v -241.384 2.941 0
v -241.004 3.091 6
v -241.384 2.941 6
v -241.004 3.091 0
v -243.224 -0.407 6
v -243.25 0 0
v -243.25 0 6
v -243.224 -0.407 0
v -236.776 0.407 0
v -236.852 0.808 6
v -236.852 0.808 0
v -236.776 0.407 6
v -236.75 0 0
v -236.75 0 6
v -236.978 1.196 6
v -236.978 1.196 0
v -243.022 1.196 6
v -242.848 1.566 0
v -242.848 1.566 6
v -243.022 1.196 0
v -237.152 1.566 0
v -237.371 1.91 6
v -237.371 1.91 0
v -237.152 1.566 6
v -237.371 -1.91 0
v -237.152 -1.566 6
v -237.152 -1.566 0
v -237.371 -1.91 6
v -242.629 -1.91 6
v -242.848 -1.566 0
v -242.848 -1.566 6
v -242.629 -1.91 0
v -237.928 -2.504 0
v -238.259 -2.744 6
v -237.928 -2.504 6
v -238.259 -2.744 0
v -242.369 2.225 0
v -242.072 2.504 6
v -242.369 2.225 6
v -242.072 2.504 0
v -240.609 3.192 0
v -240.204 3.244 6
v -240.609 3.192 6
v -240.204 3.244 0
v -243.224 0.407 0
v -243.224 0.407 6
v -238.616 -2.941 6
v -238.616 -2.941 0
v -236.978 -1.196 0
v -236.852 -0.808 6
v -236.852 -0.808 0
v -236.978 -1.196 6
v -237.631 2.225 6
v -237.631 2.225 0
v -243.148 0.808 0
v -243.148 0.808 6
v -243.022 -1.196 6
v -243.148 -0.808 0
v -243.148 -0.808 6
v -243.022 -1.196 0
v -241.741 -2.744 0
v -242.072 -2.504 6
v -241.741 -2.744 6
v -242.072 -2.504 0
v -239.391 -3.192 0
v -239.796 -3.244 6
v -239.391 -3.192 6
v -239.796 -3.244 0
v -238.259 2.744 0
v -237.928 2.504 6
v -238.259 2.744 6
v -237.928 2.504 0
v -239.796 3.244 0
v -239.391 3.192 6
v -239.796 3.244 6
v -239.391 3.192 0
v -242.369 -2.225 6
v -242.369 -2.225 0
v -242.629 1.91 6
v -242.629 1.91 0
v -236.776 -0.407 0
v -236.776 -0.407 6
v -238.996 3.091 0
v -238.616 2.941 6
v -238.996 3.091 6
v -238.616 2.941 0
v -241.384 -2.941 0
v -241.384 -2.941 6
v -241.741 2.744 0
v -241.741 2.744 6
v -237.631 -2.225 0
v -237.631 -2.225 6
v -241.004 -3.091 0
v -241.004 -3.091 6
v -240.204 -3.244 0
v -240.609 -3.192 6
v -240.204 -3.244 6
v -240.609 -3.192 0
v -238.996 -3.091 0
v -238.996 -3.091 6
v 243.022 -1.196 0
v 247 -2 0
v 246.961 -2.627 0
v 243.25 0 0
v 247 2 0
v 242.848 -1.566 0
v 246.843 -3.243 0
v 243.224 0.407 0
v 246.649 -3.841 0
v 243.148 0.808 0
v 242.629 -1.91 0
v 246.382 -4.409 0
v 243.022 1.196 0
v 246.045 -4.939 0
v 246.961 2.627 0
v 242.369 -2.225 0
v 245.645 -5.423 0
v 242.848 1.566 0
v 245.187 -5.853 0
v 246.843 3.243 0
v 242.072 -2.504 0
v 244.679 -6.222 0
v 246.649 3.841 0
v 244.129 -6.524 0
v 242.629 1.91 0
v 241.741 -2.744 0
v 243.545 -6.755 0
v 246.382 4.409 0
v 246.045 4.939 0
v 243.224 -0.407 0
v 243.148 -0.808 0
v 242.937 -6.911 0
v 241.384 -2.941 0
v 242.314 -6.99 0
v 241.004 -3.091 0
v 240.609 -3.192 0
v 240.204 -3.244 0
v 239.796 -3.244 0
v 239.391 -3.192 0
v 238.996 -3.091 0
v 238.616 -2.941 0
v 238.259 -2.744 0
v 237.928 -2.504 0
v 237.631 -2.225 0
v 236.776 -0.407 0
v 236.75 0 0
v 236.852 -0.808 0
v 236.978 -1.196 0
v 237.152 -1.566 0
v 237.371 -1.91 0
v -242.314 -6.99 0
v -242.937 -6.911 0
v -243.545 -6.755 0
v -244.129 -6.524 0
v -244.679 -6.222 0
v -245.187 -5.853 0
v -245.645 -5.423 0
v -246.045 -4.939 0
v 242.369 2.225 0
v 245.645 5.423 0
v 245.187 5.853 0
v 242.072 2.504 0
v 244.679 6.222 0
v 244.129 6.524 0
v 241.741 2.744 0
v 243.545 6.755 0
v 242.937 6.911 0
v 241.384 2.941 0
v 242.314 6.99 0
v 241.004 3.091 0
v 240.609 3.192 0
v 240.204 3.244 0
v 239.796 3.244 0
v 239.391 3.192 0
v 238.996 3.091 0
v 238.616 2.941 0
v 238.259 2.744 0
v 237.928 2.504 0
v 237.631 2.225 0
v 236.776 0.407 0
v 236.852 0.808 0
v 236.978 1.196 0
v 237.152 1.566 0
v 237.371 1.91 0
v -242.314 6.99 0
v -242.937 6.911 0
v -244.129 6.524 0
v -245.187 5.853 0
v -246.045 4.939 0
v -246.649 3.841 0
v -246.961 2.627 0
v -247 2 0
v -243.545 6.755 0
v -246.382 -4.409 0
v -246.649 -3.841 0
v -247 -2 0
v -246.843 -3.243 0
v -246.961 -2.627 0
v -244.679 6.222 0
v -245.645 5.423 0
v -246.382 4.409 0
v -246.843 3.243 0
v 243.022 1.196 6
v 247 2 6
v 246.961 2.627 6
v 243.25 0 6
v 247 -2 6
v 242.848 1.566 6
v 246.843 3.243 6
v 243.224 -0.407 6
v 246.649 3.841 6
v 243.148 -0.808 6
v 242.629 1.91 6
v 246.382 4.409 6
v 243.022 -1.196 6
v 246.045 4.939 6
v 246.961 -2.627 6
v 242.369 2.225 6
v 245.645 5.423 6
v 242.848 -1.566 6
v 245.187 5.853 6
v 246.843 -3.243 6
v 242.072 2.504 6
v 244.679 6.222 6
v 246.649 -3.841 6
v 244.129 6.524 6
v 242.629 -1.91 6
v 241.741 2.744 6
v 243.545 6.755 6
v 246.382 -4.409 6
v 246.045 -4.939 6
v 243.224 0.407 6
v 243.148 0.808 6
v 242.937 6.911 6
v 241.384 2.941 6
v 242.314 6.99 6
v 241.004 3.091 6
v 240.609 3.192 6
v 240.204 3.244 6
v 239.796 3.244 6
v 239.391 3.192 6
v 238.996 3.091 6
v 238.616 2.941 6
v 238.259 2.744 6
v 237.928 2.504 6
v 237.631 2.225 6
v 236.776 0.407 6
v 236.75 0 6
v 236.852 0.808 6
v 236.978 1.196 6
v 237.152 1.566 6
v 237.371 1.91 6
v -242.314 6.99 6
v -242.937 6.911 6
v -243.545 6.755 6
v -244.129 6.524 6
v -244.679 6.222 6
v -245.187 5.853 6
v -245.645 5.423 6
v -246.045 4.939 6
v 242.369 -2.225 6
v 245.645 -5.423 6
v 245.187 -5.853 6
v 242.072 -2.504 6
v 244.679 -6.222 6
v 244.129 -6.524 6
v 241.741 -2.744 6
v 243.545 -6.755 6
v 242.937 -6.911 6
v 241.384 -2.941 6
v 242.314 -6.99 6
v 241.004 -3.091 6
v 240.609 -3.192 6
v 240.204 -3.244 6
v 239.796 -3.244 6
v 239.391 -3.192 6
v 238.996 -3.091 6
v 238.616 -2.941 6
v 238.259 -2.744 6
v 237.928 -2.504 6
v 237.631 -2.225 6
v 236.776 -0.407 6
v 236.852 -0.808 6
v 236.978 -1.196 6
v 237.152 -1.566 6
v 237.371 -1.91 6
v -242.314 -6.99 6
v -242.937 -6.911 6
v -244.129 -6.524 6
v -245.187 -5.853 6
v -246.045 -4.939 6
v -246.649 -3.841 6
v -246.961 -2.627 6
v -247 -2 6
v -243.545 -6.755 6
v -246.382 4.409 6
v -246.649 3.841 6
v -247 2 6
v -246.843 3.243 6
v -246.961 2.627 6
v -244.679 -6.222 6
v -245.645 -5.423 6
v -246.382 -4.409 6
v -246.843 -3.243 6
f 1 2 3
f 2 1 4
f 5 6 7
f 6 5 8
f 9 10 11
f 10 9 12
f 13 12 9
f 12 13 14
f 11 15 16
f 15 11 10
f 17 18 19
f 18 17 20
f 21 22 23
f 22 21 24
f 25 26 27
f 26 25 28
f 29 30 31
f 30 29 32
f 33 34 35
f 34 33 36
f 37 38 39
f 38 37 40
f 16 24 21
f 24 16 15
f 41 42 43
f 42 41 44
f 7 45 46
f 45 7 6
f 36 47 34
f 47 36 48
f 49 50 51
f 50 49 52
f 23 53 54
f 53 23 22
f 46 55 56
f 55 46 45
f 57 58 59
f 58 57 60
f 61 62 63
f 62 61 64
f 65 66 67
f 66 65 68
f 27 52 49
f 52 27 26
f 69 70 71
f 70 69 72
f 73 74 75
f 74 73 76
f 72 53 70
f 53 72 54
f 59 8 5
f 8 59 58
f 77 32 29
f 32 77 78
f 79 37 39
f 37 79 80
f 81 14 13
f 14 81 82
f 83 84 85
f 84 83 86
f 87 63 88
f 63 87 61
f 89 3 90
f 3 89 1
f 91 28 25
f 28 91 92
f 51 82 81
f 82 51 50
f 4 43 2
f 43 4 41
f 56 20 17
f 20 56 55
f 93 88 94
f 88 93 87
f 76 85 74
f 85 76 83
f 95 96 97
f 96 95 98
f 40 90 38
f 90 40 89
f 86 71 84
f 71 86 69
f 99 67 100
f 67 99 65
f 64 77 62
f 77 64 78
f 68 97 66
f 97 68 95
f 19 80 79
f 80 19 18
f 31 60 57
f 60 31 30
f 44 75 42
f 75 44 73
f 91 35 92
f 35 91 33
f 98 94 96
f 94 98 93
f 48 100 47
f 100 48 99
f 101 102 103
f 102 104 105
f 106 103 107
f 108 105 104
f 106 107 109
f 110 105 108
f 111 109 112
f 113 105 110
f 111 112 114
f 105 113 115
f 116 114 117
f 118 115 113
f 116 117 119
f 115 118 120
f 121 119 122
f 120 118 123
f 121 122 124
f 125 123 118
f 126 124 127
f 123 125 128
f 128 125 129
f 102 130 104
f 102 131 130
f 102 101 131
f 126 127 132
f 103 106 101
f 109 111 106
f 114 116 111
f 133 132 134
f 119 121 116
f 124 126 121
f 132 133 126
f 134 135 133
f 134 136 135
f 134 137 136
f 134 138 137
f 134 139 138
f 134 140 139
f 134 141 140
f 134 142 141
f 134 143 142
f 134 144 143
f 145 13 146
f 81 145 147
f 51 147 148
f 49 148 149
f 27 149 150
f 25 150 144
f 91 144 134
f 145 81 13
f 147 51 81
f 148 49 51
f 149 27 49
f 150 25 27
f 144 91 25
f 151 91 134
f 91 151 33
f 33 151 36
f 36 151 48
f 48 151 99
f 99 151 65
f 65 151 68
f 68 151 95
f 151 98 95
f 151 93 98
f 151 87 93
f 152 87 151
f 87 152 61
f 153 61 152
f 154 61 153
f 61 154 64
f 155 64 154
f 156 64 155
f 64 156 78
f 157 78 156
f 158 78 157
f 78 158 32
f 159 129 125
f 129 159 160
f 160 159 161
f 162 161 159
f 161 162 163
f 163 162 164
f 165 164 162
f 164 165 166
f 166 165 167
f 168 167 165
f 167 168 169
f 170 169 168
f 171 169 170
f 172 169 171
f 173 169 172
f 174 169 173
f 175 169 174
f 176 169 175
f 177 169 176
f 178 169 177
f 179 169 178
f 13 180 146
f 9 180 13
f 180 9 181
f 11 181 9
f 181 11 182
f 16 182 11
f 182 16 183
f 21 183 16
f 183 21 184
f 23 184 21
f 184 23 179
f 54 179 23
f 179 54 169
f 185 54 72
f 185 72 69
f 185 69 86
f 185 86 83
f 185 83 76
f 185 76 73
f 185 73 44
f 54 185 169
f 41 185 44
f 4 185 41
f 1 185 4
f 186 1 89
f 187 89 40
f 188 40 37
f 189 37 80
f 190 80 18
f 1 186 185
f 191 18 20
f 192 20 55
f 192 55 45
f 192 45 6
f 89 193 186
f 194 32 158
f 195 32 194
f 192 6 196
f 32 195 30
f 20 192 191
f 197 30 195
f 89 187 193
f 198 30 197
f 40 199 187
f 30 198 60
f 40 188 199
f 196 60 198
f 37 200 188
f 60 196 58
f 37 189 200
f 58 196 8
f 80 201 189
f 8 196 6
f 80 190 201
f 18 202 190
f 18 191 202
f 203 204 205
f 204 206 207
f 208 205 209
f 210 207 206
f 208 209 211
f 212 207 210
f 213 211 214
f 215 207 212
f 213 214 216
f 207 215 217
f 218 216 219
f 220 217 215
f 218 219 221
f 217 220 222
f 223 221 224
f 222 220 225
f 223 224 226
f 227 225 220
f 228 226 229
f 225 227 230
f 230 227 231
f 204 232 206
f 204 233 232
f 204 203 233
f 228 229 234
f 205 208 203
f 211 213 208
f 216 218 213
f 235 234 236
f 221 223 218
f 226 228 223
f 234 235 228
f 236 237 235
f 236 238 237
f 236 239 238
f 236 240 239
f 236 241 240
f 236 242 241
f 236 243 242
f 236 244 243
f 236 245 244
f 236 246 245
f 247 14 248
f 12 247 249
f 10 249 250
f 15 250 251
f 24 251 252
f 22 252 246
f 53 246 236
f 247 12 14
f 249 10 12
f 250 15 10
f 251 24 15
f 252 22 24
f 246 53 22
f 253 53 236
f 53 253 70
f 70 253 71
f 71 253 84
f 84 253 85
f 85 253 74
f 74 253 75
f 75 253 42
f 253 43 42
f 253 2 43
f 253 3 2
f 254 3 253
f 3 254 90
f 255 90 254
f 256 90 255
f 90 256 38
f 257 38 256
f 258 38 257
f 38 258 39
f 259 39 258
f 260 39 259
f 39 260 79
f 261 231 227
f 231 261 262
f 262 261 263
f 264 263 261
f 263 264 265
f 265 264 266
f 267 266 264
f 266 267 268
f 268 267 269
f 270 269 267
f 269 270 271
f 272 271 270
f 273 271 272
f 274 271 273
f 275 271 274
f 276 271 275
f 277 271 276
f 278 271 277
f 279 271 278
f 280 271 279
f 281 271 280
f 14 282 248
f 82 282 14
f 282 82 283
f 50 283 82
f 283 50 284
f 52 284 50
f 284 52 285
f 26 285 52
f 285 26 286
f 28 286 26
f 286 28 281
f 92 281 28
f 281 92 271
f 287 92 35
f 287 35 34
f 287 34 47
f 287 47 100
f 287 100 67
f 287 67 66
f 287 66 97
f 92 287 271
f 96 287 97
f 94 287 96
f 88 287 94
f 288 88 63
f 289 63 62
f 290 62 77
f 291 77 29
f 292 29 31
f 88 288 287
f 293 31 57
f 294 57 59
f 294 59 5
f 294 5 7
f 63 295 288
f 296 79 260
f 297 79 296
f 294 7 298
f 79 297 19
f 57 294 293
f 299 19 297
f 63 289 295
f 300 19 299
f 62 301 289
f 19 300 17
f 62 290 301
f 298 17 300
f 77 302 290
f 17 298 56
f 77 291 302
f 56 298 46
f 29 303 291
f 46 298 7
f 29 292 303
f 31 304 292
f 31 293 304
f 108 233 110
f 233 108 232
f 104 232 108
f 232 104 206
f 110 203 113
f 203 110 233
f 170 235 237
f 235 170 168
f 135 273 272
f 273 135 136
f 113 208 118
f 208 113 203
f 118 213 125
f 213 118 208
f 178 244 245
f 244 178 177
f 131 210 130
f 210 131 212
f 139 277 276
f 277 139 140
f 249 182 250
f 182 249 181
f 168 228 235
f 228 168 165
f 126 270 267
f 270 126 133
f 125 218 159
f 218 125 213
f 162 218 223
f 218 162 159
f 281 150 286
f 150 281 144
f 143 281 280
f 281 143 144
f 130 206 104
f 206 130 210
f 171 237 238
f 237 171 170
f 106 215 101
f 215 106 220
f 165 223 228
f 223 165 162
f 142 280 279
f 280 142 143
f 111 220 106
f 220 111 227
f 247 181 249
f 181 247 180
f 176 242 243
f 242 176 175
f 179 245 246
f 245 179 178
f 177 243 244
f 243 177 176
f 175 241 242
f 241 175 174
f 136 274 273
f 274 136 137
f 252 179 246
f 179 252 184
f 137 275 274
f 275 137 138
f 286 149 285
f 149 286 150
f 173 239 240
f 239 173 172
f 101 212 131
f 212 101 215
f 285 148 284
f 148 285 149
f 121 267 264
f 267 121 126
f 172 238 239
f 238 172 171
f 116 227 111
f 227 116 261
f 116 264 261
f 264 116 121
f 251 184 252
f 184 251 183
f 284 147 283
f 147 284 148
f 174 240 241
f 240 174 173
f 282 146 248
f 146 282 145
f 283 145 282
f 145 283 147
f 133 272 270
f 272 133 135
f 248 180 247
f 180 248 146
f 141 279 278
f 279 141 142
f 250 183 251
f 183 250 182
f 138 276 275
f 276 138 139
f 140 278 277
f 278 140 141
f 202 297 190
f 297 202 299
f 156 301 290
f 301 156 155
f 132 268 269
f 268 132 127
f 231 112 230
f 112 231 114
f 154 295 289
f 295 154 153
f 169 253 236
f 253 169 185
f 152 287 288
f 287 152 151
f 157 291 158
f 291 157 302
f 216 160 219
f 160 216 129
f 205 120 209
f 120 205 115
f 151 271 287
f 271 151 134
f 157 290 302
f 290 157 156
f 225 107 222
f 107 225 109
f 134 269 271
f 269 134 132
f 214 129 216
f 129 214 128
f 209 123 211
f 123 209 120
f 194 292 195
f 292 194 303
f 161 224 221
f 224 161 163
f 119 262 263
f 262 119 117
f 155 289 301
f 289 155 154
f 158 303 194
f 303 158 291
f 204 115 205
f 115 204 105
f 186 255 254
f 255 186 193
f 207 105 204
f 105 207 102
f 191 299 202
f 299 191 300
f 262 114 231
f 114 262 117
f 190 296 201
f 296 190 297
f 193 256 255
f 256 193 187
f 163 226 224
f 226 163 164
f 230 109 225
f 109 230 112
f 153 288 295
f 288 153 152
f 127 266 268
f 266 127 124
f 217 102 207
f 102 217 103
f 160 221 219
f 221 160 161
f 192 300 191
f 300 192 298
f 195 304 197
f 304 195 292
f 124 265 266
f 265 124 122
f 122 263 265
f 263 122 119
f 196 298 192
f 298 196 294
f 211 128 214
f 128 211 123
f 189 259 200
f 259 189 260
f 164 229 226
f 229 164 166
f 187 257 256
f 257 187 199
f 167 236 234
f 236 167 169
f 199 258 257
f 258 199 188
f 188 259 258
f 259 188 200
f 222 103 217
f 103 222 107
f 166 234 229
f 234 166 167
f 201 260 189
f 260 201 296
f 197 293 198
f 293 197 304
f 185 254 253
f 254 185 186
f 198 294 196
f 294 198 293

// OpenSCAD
$fn = 50;


difference() {
	union() {
		hull() {
			translate(v = [-242.0000000000, 2.0000000000, 0]) {
				cylinder(h = 6, r = 5);
			}
			translate(v = [242.0000000000, 2.0000000000, 0]) {
				cylinder(h = 6, r = 5);
			}
			translate(v = [-242.0000000000, -2.0000000000, 0]) {
				cylinder(h = 6, r = 5);
			}
			translate(v = [242.0000000000, -2.0000000000, 0]) {
				cylinder(h = 6, r = 5);
			}
		}
	}
	union() {
		translate(v = [-240.0000000000, 0.0000000000, 0]) {
			cylinder(h = 6, r = 3.2500000000);
		}
		translate(v = [240.0000000000, 0.0000000000, 0]) {
			cylinder(h = 6, r = 3.2500000000);
		}
		translate(v = [-240.0000000000, 0.0000000000, 0]) {
			cylinder(h = 6, r = 1.8000000000);
		}
		translate(v = [240.0000000000, 0.0000000000, 0]) {
			cylinder(h = 6, r = 1.8000000000);
		}
		translate(v = [-240.0000000000, 0.0000000000, 0]) {
			cylinder(h = 6, r = 1.8000000000);
		}
		translate(v = [240.0000000000, 0.0000000000, 0]) {
			cylinder(h = 6, r = 1.8000000000);
		}
		translate(v = [-240.0000000000, 0.0000000000, 0]) {
			cylinder(h = 6, r = 1.8000000000);
		}
		translate(v = [240.0000000000, 0.0000000000, 0]) {
			cylinder(h = 6, r = 1.8000000000);
		}
	}
}
